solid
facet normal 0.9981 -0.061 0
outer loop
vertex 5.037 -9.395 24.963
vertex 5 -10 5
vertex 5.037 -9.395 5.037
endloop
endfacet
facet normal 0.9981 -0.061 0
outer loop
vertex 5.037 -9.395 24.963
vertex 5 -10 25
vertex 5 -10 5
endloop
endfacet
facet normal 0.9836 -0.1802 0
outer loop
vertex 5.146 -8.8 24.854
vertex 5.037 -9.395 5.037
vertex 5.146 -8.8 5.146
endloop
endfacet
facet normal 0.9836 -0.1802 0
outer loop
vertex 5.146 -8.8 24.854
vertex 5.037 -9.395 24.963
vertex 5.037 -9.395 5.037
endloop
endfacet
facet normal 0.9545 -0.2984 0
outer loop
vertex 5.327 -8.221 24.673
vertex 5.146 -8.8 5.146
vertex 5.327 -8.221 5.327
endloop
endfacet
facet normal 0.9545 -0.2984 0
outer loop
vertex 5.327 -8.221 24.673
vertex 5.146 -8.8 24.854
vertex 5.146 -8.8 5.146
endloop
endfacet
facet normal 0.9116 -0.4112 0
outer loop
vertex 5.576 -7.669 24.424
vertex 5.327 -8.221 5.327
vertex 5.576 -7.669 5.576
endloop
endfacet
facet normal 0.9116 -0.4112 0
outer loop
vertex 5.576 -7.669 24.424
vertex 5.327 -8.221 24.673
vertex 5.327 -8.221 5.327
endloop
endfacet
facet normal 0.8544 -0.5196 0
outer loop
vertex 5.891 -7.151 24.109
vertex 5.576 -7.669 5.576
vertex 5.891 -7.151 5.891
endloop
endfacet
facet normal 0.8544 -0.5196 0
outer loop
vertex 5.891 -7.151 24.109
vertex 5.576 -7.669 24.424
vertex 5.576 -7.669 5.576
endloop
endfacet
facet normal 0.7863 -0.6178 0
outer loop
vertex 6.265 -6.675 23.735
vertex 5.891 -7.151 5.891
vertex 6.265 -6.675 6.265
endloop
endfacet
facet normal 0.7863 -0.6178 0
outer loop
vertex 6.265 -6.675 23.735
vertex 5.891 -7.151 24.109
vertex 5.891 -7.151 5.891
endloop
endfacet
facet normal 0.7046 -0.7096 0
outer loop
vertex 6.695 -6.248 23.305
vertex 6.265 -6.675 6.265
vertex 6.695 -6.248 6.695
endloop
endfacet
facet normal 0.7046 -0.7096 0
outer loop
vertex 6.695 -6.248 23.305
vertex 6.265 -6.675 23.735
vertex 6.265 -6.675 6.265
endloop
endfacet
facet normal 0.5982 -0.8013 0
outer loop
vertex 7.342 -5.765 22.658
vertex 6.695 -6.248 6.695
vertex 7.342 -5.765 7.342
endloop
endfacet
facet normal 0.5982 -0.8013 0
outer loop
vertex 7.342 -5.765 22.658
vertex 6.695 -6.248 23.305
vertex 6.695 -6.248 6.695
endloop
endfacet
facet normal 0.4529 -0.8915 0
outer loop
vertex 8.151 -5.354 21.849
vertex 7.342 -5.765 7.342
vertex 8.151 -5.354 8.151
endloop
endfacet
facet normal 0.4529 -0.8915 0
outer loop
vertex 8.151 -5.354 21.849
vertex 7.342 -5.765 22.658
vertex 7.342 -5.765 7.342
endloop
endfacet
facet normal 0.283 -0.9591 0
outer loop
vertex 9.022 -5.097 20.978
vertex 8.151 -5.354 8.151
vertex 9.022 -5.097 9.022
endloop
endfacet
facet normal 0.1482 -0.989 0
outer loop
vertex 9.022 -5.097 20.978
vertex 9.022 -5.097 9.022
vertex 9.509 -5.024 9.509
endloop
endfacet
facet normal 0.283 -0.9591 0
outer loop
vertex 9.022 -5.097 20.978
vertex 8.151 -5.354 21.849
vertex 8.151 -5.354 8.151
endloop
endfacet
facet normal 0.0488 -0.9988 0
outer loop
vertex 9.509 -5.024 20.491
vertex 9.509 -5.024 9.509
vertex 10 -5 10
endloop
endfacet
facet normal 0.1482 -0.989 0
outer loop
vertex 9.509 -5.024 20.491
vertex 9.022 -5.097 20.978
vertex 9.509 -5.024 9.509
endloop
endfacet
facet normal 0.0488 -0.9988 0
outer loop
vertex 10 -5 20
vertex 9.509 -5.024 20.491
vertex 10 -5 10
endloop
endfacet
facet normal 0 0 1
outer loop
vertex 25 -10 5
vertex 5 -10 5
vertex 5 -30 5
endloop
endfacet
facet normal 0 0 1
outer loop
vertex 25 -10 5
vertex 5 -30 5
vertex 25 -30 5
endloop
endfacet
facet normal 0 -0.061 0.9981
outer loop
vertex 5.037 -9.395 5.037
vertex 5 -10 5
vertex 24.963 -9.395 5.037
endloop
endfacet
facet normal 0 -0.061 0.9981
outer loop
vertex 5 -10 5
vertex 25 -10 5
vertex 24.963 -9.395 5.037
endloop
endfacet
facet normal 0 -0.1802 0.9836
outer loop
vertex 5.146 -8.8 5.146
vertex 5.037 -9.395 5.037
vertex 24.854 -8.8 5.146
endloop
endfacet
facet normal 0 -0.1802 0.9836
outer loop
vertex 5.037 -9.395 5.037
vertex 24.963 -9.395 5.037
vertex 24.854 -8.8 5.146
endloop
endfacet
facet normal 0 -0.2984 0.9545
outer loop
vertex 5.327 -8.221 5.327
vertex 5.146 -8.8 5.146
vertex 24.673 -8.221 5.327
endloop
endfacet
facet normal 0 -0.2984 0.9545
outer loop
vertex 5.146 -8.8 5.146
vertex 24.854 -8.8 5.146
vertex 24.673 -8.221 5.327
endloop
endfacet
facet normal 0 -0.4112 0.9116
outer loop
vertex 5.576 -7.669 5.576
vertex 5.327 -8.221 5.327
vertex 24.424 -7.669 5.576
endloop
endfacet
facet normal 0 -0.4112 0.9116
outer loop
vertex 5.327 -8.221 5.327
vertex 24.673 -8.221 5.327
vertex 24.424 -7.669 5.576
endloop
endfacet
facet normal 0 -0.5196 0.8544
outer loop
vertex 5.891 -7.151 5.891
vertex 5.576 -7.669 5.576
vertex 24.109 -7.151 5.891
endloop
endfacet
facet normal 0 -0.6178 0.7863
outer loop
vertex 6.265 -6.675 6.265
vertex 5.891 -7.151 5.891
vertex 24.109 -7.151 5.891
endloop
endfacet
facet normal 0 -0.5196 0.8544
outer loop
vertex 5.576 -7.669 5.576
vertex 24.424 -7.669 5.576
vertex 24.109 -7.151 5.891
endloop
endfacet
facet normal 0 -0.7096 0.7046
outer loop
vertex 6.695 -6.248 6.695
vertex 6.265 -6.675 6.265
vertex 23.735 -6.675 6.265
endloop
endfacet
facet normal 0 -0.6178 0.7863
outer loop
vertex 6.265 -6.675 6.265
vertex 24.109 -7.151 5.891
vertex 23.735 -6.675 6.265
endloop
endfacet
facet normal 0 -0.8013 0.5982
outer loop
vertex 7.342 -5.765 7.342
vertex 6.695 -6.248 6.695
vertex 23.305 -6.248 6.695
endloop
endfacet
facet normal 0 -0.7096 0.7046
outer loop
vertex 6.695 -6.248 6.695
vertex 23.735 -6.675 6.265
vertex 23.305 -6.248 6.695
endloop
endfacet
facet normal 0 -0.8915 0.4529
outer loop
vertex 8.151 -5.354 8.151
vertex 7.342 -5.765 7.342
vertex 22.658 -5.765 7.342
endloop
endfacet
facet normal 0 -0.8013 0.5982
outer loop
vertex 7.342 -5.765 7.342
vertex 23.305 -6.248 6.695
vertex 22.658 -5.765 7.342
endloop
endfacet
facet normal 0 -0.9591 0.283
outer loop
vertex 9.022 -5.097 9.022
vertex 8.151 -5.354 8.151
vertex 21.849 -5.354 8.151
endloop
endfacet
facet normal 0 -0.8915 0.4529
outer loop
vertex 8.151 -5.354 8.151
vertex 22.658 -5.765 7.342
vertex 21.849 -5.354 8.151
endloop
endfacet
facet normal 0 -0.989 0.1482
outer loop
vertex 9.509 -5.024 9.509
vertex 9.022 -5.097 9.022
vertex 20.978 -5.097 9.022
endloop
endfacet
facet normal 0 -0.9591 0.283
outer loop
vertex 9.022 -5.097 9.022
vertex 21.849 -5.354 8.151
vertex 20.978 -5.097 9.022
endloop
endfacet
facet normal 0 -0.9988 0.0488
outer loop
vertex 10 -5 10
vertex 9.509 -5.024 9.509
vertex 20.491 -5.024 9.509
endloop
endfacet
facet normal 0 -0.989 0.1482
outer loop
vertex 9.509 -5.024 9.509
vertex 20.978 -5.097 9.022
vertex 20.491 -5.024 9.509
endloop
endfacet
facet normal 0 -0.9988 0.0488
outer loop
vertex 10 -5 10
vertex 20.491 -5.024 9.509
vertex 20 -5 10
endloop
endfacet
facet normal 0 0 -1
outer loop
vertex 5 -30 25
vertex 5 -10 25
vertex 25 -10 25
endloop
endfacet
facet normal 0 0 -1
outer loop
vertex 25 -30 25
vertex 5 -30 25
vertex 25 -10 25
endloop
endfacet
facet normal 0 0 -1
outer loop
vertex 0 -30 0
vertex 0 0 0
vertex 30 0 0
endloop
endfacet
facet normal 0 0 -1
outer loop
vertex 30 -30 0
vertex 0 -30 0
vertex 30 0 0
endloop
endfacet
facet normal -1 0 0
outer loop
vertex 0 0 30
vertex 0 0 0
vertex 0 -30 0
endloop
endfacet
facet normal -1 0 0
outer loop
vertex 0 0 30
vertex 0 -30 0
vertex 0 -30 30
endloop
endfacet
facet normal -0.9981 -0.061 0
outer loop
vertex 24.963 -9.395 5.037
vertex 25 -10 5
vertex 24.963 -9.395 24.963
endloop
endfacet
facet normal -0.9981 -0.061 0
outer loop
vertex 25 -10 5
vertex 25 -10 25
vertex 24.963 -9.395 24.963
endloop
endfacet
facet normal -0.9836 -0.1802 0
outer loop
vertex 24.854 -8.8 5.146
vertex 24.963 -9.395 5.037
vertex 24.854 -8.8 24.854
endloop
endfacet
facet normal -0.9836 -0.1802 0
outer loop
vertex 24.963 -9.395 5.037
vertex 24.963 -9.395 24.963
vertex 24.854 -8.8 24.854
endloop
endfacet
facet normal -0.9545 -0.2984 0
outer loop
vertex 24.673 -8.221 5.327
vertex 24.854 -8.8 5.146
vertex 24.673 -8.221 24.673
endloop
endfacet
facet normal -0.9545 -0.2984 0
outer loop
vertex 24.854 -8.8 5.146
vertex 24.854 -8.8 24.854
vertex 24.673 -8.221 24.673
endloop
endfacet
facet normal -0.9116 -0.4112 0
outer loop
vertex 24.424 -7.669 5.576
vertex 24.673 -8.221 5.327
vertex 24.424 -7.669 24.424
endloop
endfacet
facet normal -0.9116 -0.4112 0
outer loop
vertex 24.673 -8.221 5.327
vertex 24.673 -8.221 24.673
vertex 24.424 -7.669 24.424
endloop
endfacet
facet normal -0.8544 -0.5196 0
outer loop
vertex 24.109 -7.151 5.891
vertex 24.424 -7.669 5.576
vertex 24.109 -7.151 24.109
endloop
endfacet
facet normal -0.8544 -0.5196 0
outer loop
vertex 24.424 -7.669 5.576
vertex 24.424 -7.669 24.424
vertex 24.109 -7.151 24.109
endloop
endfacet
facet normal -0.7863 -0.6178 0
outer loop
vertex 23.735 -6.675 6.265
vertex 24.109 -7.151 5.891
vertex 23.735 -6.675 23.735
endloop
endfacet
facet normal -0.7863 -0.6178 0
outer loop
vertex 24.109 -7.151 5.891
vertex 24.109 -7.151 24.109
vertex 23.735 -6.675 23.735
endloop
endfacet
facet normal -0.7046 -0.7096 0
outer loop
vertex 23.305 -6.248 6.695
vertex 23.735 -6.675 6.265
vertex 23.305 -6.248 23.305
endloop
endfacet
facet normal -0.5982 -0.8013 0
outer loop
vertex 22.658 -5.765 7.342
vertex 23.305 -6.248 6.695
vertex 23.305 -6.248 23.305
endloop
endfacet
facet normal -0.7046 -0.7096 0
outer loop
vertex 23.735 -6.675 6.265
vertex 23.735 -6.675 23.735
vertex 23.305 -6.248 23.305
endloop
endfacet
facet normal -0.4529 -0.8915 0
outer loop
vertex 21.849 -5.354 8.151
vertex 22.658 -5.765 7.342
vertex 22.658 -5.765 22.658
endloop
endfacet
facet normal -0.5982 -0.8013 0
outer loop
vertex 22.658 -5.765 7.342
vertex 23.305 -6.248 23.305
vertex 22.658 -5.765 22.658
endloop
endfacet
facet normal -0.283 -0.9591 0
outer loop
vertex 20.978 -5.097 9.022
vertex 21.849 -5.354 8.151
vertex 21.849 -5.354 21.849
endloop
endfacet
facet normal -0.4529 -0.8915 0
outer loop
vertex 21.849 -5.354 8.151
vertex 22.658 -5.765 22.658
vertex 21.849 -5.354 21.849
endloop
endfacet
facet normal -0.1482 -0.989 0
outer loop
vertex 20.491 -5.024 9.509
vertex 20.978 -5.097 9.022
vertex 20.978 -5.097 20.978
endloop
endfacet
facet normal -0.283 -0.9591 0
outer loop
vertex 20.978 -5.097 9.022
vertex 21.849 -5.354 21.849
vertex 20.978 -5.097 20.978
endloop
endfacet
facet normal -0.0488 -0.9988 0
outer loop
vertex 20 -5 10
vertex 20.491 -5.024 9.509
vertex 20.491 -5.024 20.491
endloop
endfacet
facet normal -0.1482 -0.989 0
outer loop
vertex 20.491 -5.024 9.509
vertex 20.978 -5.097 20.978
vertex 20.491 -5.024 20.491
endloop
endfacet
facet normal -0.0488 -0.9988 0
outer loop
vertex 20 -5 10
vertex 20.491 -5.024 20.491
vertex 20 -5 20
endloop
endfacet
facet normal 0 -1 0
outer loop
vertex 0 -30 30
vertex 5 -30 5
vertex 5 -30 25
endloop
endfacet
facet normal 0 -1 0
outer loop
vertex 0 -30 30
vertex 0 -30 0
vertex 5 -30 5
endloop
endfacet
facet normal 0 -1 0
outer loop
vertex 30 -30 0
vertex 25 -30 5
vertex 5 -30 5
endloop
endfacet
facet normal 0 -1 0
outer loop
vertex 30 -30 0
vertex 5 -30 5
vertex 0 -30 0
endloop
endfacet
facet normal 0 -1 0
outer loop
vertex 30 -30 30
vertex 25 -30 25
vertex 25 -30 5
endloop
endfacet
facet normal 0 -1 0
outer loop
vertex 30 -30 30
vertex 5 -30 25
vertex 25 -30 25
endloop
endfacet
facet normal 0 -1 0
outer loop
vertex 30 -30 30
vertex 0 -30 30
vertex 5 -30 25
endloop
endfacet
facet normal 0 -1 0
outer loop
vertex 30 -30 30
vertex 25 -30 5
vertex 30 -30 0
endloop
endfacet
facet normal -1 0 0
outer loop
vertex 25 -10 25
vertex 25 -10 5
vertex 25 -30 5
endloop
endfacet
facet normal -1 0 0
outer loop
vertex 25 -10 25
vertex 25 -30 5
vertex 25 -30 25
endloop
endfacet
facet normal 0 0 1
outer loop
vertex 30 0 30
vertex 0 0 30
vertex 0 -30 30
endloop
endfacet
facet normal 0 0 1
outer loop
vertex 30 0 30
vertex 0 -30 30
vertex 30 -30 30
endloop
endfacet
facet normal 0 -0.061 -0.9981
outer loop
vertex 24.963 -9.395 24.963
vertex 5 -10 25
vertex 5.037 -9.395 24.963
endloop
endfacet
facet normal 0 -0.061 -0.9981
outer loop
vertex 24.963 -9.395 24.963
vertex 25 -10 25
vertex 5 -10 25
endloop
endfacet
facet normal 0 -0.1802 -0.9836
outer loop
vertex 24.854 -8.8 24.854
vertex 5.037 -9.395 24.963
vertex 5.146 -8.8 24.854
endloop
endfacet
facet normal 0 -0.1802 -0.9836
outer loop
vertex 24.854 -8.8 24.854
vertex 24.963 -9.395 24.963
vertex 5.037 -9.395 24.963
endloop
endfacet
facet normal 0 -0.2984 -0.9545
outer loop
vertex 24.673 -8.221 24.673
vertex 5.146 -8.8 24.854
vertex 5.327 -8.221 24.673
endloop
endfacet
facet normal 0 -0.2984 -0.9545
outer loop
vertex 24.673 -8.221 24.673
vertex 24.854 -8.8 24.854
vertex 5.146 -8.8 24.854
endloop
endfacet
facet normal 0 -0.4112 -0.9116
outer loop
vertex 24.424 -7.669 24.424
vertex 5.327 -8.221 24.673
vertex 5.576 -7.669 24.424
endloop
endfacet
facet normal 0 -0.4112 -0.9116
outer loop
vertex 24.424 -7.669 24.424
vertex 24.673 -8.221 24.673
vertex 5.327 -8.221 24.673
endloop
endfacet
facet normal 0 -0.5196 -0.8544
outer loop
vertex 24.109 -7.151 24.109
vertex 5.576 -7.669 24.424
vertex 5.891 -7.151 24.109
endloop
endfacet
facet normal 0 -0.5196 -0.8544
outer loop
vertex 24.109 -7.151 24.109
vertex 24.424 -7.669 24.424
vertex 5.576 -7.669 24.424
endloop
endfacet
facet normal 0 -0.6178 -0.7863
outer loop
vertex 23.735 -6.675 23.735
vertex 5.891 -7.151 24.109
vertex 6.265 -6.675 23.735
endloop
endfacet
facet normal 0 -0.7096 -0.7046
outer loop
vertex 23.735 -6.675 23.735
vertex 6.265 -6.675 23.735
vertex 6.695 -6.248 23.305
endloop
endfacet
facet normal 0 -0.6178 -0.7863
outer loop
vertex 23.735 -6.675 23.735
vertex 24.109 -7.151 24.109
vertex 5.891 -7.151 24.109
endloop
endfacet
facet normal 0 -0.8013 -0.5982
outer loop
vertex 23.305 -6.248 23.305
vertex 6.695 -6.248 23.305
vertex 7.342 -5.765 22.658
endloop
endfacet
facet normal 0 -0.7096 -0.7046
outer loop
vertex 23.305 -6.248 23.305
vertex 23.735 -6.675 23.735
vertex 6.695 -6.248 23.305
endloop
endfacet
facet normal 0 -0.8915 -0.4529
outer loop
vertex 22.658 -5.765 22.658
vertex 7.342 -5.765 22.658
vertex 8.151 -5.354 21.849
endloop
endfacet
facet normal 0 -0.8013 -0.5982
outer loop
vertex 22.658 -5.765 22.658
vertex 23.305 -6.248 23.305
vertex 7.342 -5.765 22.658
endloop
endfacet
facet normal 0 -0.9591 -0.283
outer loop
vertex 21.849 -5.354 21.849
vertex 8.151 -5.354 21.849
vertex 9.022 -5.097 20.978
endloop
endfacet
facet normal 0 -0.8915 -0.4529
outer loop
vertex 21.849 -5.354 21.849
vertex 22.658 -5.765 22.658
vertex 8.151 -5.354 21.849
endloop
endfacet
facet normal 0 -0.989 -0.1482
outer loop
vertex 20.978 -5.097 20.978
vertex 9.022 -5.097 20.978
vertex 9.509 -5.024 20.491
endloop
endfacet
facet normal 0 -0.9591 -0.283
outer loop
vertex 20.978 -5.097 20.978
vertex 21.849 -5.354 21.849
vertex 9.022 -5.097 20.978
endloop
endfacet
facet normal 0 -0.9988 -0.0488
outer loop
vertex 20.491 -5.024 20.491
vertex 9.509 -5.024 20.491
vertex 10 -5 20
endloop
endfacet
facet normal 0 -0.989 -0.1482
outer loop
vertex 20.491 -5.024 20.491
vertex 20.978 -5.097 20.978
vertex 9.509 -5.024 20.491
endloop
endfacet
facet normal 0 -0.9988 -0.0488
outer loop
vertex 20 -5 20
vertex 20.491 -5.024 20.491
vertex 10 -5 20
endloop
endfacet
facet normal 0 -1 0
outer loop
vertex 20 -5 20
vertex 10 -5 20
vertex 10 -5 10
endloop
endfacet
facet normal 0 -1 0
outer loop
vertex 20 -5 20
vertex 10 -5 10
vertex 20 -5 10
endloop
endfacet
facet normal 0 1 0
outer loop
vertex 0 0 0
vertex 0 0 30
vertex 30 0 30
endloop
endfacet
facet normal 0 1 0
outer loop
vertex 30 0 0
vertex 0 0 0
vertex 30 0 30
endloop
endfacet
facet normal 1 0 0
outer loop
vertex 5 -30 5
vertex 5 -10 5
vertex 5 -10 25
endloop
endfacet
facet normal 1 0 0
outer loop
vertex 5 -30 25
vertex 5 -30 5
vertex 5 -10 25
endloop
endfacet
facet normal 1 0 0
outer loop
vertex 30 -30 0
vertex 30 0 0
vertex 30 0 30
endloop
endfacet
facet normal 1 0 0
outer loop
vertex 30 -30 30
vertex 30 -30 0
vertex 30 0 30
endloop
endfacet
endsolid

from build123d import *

# Parameters (mm, degrees)
F0_W     = 30
F0_H     = 30
F1_DEPTH = 30
F2_T     = -5
F3_R     = 5


with BuildPart() as f1:
    # F0 (on Front) → F1 (new body)
    with BuildSketch(Plane.XZ):
        with Locations((15, 15)):
            Rectangle(F0_W, F0_H)
    extrude(amount=F1_DEPTH)

    # F2
    f2_openings = [f1.faces().sort_by_distance(p)[0] for p in [
        (15, -30, 15),
    ]]
    offset(amount=F2_T, openings=f2_openings)

    # F3
    f3_edges = [f1.edges().sort_by_distance(p)[0] for p in [
        (5, -5, 15),
        (15, -5, 5),
        (25, -5, 15),
        (15, -5, 25),
    ]]
    fillet(f3_edges, radius=F3_R)


solid = f1.part
